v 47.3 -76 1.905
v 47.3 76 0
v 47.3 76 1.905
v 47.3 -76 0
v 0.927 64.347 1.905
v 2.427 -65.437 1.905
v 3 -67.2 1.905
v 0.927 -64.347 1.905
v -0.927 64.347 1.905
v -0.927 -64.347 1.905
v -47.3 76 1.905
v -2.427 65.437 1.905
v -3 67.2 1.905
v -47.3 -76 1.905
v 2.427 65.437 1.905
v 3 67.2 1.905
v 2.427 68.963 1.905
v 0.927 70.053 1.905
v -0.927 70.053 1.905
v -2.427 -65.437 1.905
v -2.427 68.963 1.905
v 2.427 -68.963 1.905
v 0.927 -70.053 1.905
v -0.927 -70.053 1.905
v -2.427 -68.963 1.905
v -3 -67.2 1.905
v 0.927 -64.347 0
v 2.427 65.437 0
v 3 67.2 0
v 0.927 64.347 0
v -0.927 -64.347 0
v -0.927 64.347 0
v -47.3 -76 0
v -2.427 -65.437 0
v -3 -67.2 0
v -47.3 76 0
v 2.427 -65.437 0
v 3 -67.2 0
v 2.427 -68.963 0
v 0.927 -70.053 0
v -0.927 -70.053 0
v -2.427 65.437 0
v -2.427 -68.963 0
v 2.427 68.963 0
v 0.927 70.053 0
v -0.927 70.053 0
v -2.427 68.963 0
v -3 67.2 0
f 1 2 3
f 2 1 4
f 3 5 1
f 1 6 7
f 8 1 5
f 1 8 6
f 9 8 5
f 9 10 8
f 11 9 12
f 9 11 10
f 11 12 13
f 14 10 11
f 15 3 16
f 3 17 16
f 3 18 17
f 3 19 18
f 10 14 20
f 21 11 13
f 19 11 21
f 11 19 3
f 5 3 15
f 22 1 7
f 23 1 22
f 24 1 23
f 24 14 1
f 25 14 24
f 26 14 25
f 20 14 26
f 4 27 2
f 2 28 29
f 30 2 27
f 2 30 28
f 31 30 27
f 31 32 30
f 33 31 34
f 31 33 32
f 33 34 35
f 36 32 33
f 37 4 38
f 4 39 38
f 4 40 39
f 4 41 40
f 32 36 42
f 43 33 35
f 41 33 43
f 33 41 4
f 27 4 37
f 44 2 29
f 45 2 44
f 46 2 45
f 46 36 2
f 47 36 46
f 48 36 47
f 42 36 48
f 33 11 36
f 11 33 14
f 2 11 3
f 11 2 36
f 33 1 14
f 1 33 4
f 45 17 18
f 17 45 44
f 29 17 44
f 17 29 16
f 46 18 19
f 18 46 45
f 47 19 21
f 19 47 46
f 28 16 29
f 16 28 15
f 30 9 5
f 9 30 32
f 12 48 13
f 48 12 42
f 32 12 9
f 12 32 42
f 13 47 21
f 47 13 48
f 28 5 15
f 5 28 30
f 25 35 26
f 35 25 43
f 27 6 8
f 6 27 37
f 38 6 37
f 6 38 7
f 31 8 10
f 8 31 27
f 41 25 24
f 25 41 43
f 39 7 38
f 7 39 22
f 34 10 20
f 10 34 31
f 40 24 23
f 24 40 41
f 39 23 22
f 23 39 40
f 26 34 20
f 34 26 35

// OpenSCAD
// file: bedleg.scad
module bedleg(cw_w = 5.08, cw_h = 15.24, mirror = true, leglength=28) 
{
    if (mirror) 
    {
        translate([-cw_w,0,-leglength]) color([0.40,0.30,0.16,1.0])
            cube([cw_w, cw_h, leglength],center=false);
        
        translate([-cw_w-cw_h,0,-leglength]) color([0.51,0.38,0.24,1.0])
            cube([cw_h, cw_w, leglength],center=false);
    }
    else {
        translate([0,0,-leglength]) color([0.40,0.30,0.16,1.0])
            cube([cw_w, cw_h, leglength],center=false);
        
        translate([cw_w,0,-leglength]) color([0.51,0.38,0.24,1.0])
            cube([cw_h, cw_w, leglength],center=false);
    }
}

bedleg();
// main file
use <bedleg.scad> 
playwood_thickness = 0.75 * 2.54;
finger_hole_diam = 6.0;
spacing = 0.2;

module playwood(matress_length=190, matress_width = 152.4) 
{
    translate([0,0,playwood_thickness/2])
        difference() 
        {
            color([0.80,0.43,0.32])
            cube([matress_length/2-2*spacing, matress_width-2*spacing, playwood_thickness],center=true);
    
            translate([0, matress_width/2 - finger_hole_diam * 1.5,0])   
                cylinder(r = finger_hole_diam/2, 
                    h = playwood_thickness + 0.1,
                    center=true);
            
            translate([0, -matress_width/2 + finger_hole_diam * 1.5,0])   
                cylinder(r = finger_hole_diam/2, 
                    h = playwood_thickness + 0.1,
                    center=true);
        }
}

playwood();
